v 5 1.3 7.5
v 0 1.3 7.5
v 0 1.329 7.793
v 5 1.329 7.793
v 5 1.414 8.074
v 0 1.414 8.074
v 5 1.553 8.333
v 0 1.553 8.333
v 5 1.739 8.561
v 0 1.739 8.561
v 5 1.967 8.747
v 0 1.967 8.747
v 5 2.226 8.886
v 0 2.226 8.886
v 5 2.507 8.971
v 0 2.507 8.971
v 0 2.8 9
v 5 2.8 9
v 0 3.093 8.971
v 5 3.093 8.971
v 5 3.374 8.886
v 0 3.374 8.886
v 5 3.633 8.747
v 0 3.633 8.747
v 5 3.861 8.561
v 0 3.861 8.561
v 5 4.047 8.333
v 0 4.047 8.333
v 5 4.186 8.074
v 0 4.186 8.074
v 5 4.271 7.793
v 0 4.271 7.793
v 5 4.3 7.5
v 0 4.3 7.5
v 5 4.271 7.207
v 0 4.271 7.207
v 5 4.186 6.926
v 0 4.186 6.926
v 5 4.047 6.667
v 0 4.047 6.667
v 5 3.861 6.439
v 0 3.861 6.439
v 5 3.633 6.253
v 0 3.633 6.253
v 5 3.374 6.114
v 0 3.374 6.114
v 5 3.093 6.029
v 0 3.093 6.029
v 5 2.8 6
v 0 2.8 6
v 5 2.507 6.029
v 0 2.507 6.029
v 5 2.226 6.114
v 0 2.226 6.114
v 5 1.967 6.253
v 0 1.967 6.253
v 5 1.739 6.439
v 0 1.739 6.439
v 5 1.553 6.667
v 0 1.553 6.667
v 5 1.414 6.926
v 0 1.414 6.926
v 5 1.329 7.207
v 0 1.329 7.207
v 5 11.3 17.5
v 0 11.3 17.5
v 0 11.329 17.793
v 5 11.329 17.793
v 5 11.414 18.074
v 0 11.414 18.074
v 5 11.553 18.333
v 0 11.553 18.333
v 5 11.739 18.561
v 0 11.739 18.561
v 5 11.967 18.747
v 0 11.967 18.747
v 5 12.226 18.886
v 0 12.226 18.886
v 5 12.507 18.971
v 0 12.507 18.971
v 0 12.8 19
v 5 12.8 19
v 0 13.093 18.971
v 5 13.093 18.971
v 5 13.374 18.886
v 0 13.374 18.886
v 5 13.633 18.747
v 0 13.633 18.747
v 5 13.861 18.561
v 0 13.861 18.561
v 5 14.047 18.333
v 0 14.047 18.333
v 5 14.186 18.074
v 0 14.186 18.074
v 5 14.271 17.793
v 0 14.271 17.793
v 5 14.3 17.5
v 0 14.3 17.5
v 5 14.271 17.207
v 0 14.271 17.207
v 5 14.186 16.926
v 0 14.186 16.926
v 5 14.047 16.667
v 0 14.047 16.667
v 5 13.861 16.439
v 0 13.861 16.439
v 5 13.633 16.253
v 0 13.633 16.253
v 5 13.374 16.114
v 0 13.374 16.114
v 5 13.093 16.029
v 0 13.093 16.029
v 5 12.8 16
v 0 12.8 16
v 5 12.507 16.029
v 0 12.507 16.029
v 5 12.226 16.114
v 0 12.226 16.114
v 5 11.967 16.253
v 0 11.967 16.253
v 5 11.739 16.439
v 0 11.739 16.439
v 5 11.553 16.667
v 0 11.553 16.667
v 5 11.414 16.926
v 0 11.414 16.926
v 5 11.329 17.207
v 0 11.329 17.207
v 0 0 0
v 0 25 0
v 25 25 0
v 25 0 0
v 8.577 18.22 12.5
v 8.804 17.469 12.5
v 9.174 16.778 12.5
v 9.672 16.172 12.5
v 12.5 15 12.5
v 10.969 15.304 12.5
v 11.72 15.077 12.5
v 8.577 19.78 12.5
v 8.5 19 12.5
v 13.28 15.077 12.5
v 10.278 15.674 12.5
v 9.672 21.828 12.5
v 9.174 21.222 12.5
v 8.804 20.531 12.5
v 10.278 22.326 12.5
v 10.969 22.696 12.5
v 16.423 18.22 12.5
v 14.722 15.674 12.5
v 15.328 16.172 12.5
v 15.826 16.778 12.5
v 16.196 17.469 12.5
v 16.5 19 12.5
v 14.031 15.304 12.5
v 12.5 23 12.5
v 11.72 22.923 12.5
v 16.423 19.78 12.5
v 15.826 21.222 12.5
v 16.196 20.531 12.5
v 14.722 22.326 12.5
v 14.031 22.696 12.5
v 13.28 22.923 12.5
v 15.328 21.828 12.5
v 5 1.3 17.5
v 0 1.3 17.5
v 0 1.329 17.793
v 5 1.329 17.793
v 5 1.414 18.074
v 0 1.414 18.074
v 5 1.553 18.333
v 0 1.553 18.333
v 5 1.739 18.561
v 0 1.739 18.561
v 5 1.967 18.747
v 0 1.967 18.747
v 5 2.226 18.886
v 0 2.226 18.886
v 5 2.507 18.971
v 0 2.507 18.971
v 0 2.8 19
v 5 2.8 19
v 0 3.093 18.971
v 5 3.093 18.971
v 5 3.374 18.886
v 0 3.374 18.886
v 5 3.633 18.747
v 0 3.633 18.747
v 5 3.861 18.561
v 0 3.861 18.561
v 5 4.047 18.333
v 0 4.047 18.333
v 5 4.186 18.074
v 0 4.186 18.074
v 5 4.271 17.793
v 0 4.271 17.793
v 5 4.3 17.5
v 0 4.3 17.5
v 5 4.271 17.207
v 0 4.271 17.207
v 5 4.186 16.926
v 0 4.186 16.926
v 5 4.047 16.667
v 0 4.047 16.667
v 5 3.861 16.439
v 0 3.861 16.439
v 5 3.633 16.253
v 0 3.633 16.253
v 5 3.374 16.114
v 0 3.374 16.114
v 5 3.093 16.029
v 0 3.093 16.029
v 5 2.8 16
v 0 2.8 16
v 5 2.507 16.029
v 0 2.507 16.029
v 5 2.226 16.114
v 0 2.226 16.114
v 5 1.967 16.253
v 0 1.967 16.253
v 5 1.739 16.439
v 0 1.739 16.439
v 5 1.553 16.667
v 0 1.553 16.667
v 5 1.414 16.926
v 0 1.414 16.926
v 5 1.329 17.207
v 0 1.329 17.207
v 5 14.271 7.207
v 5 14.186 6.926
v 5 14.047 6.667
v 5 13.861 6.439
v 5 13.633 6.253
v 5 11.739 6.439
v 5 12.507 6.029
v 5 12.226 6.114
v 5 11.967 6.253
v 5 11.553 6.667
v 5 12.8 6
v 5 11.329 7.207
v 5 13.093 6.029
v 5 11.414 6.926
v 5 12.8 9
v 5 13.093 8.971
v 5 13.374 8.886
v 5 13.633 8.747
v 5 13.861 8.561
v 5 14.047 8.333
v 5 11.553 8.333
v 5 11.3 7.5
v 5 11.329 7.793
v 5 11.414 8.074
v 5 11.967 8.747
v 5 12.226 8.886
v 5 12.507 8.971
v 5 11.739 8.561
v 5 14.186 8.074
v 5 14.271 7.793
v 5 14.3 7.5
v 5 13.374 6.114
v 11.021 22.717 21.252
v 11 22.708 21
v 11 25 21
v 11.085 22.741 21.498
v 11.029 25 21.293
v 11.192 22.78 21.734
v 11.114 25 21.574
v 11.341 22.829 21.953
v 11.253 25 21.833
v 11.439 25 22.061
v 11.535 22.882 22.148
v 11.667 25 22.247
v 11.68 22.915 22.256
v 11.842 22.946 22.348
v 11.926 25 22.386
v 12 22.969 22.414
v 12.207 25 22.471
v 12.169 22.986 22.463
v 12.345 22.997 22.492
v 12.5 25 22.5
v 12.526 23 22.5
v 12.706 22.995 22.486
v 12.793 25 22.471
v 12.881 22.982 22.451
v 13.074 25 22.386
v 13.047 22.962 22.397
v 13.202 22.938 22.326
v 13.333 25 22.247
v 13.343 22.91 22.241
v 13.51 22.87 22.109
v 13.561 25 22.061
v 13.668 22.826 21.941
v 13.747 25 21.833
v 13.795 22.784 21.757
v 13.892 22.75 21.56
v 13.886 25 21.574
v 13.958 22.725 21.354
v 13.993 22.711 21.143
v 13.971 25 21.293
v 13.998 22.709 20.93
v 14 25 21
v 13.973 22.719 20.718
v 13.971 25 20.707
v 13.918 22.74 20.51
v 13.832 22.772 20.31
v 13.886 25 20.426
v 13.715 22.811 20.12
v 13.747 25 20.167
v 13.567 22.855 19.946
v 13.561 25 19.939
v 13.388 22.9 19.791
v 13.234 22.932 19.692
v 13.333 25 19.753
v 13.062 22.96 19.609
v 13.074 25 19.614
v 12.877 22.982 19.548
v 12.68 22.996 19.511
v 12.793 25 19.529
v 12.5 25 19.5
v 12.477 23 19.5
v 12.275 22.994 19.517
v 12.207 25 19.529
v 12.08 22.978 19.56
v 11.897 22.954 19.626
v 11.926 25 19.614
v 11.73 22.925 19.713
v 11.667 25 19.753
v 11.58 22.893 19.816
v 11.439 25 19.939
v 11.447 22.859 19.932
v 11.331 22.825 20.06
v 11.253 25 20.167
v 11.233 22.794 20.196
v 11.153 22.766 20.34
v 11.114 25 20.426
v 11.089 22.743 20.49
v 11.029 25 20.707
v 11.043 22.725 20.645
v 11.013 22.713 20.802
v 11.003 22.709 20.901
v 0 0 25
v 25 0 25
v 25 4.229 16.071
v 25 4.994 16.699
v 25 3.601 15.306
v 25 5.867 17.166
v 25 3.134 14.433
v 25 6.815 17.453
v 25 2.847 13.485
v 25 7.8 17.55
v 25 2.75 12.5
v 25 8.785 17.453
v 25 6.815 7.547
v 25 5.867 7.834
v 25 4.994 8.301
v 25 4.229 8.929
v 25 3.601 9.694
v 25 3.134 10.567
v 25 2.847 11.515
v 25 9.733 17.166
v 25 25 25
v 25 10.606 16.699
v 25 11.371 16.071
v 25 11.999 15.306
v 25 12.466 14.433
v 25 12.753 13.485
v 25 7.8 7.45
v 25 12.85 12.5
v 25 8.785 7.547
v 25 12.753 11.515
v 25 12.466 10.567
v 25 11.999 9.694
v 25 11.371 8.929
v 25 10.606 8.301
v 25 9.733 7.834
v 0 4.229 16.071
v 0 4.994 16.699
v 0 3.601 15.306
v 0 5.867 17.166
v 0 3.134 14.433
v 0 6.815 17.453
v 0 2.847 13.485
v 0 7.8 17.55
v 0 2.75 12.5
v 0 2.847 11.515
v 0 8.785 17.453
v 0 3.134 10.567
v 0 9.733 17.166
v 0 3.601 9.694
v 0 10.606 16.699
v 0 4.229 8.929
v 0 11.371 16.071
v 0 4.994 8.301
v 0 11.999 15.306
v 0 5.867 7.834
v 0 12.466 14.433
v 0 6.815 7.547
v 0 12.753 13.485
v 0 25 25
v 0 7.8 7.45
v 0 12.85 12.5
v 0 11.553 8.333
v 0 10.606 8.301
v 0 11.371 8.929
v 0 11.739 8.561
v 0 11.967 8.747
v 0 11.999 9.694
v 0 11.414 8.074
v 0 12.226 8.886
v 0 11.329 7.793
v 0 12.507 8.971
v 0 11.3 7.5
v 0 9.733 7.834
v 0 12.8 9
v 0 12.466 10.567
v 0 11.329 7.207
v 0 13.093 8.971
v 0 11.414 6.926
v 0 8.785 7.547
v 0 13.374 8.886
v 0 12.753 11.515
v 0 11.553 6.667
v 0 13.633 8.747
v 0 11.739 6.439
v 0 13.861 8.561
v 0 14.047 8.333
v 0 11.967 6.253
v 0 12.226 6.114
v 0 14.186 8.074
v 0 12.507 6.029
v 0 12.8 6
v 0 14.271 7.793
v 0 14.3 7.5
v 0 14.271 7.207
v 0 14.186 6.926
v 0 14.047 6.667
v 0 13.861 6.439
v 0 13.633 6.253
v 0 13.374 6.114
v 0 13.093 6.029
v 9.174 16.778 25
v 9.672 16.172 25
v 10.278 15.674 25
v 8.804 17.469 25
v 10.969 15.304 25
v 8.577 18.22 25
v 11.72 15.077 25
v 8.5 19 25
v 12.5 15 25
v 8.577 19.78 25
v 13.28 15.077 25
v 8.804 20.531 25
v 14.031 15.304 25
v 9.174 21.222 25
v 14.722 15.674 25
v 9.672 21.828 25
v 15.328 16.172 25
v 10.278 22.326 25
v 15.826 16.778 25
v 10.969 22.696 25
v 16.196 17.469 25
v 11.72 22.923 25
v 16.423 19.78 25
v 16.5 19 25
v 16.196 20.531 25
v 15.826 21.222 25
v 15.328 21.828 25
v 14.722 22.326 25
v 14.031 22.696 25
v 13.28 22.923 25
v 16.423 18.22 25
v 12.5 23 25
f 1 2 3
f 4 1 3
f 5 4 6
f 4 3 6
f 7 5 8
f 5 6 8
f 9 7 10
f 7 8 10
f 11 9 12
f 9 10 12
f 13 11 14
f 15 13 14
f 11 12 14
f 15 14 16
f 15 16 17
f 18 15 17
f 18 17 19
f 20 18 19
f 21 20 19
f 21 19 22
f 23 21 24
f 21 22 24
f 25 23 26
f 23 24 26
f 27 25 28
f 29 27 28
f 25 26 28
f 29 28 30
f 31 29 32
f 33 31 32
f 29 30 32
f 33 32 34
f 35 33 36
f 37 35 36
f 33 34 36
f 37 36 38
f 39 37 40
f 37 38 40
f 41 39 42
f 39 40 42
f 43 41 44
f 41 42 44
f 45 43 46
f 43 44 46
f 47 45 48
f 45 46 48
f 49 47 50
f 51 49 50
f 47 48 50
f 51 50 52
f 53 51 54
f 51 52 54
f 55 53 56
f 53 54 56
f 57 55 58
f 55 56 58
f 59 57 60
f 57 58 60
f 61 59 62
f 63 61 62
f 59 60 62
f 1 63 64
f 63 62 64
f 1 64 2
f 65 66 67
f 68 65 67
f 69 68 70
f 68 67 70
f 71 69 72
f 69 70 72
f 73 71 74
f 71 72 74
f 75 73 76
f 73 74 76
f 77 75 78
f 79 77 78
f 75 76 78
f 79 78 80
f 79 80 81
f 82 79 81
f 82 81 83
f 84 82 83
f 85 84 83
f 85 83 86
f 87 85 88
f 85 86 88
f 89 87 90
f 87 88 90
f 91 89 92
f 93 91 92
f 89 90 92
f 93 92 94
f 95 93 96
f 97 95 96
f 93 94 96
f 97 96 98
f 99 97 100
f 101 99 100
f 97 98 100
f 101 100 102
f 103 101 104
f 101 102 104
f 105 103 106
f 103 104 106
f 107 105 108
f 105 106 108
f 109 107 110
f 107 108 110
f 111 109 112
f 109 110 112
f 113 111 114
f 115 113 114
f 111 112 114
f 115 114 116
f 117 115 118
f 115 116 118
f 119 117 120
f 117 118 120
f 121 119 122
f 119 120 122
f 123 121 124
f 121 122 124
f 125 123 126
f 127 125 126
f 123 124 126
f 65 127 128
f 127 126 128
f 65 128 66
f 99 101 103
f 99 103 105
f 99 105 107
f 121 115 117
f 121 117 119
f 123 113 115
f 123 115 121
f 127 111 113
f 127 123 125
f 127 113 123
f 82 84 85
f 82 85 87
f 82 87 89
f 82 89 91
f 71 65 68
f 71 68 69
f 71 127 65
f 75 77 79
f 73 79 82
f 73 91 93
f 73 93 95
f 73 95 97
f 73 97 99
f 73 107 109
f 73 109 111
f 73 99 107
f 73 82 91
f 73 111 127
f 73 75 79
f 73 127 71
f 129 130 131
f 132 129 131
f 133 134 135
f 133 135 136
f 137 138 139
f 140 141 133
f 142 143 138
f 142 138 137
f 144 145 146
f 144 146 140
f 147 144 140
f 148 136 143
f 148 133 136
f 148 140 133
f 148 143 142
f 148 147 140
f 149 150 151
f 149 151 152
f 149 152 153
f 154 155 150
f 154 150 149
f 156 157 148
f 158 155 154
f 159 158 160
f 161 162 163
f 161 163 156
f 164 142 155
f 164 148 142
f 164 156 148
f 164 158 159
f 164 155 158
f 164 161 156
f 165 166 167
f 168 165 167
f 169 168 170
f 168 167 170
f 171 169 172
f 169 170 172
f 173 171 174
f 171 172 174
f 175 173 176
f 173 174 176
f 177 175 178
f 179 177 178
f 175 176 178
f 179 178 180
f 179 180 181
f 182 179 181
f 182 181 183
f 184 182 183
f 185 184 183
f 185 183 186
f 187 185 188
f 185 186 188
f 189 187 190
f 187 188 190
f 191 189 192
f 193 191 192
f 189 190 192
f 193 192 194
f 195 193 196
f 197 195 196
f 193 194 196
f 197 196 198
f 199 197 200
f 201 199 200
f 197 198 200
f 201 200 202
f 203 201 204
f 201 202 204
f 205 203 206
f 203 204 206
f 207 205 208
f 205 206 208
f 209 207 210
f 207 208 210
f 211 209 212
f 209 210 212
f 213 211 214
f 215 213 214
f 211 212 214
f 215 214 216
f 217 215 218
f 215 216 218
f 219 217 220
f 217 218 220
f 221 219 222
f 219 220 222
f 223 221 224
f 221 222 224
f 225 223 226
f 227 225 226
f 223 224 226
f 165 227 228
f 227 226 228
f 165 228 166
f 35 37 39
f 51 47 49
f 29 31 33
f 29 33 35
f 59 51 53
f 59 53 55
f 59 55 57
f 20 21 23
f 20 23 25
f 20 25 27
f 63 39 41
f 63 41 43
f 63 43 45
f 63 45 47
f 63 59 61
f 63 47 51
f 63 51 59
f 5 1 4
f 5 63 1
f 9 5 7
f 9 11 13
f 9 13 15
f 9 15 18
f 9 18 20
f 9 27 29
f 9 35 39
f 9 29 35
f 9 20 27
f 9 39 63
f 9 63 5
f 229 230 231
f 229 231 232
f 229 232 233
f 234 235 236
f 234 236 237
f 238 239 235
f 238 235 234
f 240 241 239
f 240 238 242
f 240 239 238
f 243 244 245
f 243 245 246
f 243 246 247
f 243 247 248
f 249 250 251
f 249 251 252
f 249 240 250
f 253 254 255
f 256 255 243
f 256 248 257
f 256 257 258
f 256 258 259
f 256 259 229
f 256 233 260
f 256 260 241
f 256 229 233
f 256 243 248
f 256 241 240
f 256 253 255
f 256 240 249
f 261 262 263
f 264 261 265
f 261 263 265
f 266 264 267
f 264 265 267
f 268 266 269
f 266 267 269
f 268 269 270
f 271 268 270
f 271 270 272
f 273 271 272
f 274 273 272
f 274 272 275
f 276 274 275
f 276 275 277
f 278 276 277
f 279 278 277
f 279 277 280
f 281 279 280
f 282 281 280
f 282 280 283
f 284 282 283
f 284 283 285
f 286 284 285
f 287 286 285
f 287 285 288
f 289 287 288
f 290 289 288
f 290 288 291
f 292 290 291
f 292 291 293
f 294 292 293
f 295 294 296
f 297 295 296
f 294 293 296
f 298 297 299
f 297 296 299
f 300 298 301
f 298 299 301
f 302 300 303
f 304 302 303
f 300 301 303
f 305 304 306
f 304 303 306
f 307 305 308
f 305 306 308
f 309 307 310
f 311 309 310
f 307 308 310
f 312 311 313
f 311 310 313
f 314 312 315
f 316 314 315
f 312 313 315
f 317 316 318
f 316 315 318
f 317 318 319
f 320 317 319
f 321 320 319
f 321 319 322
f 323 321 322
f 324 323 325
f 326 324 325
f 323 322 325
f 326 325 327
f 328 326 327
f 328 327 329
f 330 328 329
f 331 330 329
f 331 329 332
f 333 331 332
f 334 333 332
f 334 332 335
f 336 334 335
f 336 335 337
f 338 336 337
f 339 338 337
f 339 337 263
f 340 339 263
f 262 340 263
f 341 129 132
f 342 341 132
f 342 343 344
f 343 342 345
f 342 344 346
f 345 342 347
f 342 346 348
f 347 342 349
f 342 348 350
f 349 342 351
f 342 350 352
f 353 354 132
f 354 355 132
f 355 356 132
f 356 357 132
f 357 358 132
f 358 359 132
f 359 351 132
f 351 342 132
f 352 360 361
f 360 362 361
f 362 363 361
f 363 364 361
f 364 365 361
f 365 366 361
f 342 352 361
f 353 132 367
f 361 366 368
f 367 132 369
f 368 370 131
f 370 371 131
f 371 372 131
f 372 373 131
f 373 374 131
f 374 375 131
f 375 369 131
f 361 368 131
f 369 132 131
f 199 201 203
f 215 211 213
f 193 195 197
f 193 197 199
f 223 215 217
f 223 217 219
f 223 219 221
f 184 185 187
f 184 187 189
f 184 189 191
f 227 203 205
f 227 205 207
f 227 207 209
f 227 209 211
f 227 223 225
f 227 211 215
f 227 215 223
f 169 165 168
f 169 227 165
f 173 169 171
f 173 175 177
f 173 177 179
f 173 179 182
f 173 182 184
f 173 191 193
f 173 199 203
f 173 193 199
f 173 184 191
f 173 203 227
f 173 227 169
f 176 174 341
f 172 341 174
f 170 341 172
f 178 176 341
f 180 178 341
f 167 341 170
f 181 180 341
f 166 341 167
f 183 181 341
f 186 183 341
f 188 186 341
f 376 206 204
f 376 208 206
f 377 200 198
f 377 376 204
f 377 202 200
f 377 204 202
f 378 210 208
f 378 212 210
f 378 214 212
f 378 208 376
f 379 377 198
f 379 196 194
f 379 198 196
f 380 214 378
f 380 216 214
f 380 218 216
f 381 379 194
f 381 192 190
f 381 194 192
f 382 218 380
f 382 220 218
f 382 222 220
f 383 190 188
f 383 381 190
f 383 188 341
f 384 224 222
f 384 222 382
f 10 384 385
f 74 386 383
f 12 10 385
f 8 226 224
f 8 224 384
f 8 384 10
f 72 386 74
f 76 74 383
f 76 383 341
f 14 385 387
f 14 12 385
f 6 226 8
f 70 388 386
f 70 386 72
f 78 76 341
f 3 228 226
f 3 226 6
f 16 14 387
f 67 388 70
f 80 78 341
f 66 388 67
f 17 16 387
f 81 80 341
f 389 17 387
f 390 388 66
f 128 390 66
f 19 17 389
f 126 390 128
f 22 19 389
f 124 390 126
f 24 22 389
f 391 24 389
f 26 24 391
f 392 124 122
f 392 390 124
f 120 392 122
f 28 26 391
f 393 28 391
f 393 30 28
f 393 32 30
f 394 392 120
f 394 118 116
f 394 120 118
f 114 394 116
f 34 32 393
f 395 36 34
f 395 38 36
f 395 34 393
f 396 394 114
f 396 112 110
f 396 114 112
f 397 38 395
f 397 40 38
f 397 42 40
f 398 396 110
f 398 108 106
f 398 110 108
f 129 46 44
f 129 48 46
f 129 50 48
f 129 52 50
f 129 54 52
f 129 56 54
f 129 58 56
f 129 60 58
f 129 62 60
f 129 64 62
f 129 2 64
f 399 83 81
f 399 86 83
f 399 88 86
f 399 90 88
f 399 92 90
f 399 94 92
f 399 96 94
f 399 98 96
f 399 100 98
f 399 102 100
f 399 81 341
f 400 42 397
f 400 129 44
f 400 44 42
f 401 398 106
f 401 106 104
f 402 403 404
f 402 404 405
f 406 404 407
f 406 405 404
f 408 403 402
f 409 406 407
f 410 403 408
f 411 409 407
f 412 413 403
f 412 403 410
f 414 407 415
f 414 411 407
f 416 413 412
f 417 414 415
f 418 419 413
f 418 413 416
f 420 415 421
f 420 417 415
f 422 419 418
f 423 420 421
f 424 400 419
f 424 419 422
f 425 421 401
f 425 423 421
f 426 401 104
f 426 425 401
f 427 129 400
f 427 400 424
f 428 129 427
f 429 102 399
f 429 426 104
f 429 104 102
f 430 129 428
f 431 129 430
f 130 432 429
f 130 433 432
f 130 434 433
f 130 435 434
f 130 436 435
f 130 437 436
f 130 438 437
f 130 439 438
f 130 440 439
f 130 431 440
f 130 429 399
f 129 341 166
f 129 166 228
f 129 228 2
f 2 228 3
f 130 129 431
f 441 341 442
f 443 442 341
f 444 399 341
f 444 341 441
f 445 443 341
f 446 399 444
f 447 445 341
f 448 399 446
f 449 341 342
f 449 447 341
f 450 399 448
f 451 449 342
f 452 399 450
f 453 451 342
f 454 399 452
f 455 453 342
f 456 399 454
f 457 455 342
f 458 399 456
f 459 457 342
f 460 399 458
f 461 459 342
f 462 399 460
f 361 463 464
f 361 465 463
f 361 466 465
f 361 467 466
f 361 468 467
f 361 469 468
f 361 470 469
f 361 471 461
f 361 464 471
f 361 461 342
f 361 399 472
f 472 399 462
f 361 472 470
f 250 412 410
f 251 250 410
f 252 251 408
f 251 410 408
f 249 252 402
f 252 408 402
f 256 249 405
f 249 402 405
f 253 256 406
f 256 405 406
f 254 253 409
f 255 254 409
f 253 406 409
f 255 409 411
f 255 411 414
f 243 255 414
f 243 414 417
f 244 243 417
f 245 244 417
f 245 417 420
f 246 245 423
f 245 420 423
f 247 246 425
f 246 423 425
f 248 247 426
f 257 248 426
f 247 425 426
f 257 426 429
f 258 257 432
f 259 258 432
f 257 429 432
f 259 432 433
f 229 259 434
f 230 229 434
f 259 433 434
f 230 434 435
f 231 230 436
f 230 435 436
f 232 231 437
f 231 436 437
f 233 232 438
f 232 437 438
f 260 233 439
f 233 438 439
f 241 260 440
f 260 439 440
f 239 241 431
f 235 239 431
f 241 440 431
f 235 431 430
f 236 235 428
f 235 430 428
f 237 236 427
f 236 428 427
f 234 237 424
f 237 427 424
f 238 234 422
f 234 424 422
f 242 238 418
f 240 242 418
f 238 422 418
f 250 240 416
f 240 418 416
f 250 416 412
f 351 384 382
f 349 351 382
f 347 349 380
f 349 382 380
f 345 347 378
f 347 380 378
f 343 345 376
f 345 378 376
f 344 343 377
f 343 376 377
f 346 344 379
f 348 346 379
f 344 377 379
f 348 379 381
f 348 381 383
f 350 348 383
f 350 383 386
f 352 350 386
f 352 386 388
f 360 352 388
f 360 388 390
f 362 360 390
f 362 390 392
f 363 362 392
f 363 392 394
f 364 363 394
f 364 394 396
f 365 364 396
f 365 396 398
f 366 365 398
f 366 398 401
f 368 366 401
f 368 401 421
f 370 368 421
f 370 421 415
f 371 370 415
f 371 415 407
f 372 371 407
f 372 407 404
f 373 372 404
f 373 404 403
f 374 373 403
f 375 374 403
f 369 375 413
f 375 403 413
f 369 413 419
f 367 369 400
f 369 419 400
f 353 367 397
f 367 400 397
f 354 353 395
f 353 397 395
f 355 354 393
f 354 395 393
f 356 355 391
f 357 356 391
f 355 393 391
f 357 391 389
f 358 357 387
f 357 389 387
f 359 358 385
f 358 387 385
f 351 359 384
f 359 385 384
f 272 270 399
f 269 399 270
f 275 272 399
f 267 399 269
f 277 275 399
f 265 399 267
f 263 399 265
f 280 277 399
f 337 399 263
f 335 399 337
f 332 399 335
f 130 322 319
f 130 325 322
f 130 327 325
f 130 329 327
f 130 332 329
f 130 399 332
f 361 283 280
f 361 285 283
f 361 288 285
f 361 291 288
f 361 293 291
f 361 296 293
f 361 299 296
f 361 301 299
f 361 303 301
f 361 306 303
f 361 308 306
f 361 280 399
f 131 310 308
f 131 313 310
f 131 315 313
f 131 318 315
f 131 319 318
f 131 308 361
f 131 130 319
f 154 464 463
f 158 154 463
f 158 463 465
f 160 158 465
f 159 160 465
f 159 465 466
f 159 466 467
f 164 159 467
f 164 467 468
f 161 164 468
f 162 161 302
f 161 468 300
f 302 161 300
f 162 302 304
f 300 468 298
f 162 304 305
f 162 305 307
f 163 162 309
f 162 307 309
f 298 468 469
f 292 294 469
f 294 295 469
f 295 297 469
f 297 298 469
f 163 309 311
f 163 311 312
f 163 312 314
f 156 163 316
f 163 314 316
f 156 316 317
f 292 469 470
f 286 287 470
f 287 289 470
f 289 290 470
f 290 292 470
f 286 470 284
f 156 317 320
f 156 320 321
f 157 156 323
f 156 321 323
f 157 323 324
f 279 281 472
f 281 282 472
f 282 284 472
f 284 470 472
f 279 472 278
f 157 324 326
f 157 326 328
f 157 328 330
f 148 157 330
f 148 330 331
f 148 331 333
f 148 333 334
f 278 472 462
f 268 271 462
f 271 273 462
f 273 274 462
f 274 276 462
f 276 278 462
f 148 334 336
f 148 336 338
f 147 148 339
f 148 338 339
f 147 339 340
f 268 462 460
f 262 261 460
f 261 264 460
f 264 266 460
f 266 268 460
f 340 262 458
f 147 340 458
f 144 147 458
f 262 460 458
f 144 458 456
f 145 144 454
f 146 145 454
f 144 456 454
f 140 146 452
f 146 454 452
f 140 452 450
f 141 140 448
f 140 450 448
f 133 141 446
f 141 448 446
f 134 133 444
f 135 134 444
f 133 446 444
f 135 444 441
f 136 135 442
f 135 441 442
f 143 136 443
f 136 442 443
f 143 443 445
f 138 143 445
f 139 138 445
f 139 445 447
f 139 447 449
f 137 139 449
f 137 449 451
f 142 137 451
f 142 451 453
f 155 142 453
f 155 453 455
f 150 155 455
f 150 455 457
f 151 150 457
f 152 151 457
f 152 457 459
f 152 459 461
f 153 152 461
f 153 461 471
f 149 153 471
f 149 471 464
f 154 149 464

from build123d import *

# Parameters (mm, degrees)
F0_W     = 25
F0_H     = 25
F1_DEPTH = 25
F2_R     = 4
F3_DEPTH = 12.5
F4_R     = 1.5
F5_DEPTH = 6
F6_R     = 1.5
F7_DEPTH = 5
F8_R     = 5.05
F9_DEPTH = 25.001


with BuildPart() as f1:
    # F0 (on Top) → F1 (new body)
    with BuildSketch(Plane.XY):
        with Locations((12.5, 12.5)):
            Rectangle(F0_W, F0_H)
    extrude(amount=F1_DEPTH)

    # F2 (on face) → F3 (cut)
    with BuildSketch(Plane.XY.offset(25)):
        with Locations((12.5, 19)):
            Circle(F2_R)
    extrude(amount=-F3_DEPTH, mode=Mode.SUBTRACT)

    # F4 (on face) → F5 (cut)
    with BuildSketch(Plane(origin=(0, 25, 0), x_dir=(-1, 0, 0), z_dir=(0, 1, 0))):
        with Locations((-12.5, 21)):
            Circle(F4_R)
    extrude(amount=-F5_DEPTH, mode=Mode.SUBTRACT)

    # F6 (on face) → F7 (cut)
    with BuildSketch(Plane(origin=(0, 0, 0), x_dir=(0, -1, 0), z_dir=(-1, 0, 0))):
        with Locations((-2.8, 7.5)):
            Circle(F6_R)
        with Locations((-2.8, 17.5)):
            Circle(F6_R)
        with Locations((-12.8, 7.5)):
            Circle(F6_R)
        with Locations((-12.8, 17.5)):
            Circle(F6_R)
    extrude(amount=-F7_DEPTH, mode=Mode.SUBTRACT)

    # F8 (on face) → F9 (cut, through all)
    with BuildSketch(Plane(origin=(0, 0, 0), x_dir=(0, -1, 0), z_dir=(-1, 0, 0))):
        with Locations((-7.8, 12.5)):
            Circle(F8_R)
    extrude(amount=-F9_DEPTH, mode=Mode.SUBTRACT)


solid = f1.part
